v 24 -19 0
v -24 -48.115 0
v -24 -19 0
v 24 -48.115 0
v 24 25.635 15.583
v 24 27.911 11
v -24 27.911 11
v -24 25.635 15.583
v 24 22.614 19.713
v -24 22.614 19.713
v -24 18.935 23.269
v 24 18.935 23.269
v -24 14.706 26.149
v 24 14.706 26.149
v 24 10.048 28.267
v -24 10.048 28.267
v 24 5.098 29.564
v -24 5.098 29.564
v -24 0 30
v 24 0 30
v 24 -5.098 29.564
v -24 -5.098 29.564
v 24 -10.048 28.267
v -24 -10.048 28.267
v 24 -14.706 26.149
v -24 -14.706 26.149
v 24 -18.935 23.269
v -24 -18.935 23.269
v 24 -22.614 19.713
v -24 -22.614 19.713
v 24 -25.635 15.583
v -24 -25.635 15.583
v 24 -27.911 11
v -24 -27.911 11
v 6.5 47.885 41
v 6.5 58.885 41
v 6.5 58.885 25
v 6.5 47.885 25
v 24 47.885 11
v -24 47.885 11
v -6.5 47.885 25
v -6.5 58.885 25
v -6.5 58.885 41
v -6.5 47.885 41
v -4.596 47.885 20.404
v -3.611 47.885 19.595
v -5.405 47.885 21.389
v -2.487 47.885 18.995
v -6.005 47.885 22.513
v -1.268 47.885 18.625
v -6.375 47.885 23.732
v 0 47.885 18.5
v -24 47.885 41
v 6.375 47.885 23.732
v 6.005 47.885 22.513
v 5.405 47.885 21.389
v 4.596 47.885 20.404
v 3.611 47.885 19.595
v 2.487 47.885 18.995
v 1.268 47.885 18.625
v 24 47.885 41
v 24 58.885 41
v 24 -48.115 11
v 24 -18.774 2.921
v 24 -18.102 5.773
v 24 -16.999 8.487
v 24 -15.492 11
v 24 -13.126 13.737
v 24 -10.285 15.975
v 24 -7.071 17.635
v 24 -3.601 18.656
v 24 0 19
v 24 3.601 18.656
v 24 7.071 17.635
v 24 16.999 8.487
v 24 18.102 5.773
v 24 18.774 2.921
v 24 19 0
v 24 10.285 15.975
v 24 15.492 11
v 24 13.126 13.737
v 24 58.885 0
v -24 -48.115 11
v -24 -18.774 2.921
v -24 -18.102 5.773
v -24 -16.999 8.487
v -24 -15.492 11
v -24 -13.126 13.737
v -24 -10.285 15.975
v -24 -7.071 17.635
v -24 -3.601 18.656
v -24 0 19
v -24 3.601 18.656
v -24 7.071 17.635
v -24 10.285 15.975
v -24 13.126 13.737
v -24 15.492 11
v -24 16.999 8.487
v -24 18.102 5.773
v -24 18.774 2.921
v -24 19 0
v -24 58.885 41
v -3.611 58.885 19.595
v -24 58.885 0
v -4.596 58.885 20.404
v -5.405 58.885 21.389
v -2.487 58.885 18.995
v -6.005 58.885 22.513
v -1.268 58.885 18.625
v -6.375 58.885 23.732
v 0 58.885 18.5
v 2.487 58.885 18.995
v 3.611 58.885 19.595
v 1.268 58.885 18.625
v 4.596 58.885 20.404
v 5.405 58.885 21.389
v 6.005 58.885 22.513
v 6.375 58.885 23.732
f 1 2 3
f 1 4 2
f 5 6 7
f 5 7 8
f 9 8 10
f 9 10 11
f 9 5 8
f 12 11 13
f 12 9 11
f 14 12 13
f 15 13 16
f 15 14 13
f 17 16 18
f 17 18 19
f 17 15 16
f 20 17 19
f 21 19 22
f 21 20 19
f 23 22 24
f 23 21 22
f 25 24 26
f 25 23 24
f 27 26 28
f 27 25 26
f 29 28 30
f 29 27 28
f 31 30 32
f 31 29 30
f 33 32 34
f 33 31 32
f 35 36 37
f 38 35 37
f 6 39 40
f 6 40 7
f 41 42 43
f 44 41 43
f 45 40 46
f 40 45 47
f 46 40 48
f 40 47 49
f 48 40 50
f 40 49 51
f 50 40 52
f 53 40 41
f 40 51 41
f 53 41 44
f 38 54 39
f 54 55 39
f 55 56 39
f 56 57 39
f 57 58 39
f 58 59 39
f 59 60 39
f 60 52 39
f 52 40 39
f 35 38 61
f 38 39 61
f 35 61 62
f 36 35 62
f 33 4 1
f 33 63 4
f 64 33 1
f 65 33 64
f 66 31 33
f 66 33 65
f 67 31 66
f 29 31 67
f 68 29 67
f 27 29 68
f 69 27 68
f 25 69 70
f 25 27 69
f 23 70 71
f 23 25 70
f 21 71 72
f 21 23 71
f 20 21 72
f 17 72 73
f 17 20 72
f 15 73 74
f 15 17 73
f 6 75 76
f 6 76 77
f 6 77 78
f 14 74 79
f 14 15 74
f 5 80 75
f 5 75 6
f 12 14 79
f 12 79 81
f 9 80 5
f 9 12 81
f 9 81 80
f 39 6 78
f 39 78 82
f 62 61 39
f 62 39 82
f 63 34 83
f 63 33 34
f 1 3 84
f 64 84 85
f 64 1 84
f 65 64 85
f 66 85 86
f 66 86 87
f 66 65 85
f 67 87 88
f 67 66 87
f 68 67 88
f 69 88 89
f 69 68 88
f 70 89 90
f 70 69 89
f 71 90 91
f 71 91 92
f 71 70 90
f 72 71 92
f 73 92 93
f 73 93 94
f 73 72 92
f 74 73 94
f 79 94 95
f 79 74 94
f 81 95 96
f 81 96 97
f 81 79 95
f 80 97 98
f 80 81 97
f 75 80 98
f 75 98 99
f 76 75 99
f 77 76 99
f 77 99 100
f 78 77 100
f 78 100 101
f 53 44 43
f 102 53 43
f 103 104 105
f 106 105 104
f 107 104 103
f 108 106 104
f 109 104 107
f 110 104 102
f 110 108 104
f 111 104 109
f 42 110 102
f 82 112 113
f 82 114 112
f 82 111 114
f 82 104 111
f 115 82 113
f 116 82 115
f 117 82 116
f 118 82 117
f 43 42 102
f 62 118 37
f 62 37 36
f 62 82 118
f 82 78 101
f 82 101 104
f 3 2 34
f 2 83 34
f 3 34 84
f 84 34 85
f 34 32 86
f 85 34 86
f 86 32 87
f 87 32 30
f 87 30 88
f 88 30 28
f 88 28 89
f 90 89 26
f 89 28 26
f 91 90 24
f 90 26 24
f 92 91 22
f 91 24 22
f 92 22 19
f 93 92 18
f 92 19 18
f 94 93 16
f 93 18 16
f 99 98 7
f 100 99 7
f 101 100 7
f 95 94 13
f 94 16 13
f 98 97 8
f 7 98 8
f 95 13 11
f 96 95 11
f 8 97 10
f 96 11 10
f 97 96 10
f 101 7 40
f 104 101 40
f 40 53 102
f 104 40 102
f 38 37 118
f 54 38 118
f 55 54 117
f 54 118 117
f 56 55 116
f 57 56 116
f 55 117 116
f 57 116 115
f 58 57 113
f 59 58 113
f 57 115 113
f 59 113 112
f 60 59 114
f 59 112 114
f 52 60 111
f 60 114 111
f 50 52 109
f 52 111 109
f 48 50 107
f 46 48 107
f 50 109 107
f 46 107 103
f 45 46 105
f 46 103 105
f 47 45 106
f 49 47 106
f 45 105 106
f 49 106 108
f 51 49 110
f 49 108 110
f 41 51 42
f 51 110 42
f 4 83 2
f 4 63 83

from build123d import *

# Parameters (mm, degrees)
F0_W     = 11
F0_H     = 30
F1_DEPTH = 24
F3_DEPTH = 30.3


with BuildPart() as f1:
    # F0 (on Right) → F1 (new body, symmetric)
    with BuildSketch(Plane.YZ):
        with BuildLine():
            Line((-48.1145605445, 0), (-30, 0))
            ThreePointArc((-30, 0), (-29.4730143031, 5.5983415304), (-27.9105714739, 11))
            Line((-27.9105714739, 11), (-48.1145605445, 11))
            Line((-48.1145605445, 11), (-48.1145605445, 0))
        make_face()
        with Locations((53.3854394555, 26)):
            Rectangle(F0_W, F0_H)
        with BuildLine():
            ThreePointArc((27.9105714739, 11), (29.4730143031, 5.5983415304), (30, 0))
            Line((30, 0), (58.8854394555, 0))
            Line((58.8854394555, 0), (58.8854394555, 11))
            Line((58.8854394555, 11), (47.8854394555, 11))
            Line((47.8854394555, 11), (27.9105714739, 11))
        make_face()
        with BuildLine():
            Line((15.4919333848, 11), (27.9105714739, 11))
            ThreePointArc((27.9105714739, 11), (0, 30), (-27.9105714739, 11))
            Line((-27.9105714739, 11), (-15.4919333848, 11))
            ThreePointArc((-15.4919333848, 11), (0, 19), (15.4919333848, 11))
        make_face()
        with BuildLine():
            Line((19, 0), (30, 0))
            ThreePointArc((30, 0), (29.4730143031, 5.5983415304), (27.9105714739, 11))
            Line((27.9105714739, 11), (15.4919333848, 11))
            ThreePointArc((15.4919333848, 11), (18.1017503893, 5.7729223833), (19, 0))
        make_face()
        with BuildLine():
            ThreePointArc((-27.9105714739, 11), (-29.4730143031, 5.5983415304), (-30, 0))
            Line((-30, 0), (-19, 0))
            ThreePointArc((-19, 0), (-18.1017503893, 5.7729223833), (-15.4919333848, 11))
            Line((-15.4919333848, 11), (-27.9105714739, 11))
        make_face()
    extrude(amount=F1_DEPTH, both=True)

    # F2 (on face) → F3 (cut)
    with BuildSketch(Plane(origin=(0, 58.8854394555, 0), x_dir=(-1, 0, 0), z_dir=(0, 1, 0))):
        with BuildLine():
            ThreePointArc((-6.5, 25), (0, 18.5), (6.5, 25))
            ThreePointArc((6.5, 25), (0, 31.5), (-6.5, 25))
        make_face()
        with BuildLine():
            ThreePointArc((-6.5, 25), (0, 31.5), (6.5, 25))
            Line((6.5, 25), (6.5, 41))
            Line((6.5, 41), (-6.5, 41))
            Line((-6.5, 41), (-6.5, 25))
        make_face()
    extrude(amount=-F3_DEPTH, mode=Mode.SUBTRACT)


solid = f1.part
